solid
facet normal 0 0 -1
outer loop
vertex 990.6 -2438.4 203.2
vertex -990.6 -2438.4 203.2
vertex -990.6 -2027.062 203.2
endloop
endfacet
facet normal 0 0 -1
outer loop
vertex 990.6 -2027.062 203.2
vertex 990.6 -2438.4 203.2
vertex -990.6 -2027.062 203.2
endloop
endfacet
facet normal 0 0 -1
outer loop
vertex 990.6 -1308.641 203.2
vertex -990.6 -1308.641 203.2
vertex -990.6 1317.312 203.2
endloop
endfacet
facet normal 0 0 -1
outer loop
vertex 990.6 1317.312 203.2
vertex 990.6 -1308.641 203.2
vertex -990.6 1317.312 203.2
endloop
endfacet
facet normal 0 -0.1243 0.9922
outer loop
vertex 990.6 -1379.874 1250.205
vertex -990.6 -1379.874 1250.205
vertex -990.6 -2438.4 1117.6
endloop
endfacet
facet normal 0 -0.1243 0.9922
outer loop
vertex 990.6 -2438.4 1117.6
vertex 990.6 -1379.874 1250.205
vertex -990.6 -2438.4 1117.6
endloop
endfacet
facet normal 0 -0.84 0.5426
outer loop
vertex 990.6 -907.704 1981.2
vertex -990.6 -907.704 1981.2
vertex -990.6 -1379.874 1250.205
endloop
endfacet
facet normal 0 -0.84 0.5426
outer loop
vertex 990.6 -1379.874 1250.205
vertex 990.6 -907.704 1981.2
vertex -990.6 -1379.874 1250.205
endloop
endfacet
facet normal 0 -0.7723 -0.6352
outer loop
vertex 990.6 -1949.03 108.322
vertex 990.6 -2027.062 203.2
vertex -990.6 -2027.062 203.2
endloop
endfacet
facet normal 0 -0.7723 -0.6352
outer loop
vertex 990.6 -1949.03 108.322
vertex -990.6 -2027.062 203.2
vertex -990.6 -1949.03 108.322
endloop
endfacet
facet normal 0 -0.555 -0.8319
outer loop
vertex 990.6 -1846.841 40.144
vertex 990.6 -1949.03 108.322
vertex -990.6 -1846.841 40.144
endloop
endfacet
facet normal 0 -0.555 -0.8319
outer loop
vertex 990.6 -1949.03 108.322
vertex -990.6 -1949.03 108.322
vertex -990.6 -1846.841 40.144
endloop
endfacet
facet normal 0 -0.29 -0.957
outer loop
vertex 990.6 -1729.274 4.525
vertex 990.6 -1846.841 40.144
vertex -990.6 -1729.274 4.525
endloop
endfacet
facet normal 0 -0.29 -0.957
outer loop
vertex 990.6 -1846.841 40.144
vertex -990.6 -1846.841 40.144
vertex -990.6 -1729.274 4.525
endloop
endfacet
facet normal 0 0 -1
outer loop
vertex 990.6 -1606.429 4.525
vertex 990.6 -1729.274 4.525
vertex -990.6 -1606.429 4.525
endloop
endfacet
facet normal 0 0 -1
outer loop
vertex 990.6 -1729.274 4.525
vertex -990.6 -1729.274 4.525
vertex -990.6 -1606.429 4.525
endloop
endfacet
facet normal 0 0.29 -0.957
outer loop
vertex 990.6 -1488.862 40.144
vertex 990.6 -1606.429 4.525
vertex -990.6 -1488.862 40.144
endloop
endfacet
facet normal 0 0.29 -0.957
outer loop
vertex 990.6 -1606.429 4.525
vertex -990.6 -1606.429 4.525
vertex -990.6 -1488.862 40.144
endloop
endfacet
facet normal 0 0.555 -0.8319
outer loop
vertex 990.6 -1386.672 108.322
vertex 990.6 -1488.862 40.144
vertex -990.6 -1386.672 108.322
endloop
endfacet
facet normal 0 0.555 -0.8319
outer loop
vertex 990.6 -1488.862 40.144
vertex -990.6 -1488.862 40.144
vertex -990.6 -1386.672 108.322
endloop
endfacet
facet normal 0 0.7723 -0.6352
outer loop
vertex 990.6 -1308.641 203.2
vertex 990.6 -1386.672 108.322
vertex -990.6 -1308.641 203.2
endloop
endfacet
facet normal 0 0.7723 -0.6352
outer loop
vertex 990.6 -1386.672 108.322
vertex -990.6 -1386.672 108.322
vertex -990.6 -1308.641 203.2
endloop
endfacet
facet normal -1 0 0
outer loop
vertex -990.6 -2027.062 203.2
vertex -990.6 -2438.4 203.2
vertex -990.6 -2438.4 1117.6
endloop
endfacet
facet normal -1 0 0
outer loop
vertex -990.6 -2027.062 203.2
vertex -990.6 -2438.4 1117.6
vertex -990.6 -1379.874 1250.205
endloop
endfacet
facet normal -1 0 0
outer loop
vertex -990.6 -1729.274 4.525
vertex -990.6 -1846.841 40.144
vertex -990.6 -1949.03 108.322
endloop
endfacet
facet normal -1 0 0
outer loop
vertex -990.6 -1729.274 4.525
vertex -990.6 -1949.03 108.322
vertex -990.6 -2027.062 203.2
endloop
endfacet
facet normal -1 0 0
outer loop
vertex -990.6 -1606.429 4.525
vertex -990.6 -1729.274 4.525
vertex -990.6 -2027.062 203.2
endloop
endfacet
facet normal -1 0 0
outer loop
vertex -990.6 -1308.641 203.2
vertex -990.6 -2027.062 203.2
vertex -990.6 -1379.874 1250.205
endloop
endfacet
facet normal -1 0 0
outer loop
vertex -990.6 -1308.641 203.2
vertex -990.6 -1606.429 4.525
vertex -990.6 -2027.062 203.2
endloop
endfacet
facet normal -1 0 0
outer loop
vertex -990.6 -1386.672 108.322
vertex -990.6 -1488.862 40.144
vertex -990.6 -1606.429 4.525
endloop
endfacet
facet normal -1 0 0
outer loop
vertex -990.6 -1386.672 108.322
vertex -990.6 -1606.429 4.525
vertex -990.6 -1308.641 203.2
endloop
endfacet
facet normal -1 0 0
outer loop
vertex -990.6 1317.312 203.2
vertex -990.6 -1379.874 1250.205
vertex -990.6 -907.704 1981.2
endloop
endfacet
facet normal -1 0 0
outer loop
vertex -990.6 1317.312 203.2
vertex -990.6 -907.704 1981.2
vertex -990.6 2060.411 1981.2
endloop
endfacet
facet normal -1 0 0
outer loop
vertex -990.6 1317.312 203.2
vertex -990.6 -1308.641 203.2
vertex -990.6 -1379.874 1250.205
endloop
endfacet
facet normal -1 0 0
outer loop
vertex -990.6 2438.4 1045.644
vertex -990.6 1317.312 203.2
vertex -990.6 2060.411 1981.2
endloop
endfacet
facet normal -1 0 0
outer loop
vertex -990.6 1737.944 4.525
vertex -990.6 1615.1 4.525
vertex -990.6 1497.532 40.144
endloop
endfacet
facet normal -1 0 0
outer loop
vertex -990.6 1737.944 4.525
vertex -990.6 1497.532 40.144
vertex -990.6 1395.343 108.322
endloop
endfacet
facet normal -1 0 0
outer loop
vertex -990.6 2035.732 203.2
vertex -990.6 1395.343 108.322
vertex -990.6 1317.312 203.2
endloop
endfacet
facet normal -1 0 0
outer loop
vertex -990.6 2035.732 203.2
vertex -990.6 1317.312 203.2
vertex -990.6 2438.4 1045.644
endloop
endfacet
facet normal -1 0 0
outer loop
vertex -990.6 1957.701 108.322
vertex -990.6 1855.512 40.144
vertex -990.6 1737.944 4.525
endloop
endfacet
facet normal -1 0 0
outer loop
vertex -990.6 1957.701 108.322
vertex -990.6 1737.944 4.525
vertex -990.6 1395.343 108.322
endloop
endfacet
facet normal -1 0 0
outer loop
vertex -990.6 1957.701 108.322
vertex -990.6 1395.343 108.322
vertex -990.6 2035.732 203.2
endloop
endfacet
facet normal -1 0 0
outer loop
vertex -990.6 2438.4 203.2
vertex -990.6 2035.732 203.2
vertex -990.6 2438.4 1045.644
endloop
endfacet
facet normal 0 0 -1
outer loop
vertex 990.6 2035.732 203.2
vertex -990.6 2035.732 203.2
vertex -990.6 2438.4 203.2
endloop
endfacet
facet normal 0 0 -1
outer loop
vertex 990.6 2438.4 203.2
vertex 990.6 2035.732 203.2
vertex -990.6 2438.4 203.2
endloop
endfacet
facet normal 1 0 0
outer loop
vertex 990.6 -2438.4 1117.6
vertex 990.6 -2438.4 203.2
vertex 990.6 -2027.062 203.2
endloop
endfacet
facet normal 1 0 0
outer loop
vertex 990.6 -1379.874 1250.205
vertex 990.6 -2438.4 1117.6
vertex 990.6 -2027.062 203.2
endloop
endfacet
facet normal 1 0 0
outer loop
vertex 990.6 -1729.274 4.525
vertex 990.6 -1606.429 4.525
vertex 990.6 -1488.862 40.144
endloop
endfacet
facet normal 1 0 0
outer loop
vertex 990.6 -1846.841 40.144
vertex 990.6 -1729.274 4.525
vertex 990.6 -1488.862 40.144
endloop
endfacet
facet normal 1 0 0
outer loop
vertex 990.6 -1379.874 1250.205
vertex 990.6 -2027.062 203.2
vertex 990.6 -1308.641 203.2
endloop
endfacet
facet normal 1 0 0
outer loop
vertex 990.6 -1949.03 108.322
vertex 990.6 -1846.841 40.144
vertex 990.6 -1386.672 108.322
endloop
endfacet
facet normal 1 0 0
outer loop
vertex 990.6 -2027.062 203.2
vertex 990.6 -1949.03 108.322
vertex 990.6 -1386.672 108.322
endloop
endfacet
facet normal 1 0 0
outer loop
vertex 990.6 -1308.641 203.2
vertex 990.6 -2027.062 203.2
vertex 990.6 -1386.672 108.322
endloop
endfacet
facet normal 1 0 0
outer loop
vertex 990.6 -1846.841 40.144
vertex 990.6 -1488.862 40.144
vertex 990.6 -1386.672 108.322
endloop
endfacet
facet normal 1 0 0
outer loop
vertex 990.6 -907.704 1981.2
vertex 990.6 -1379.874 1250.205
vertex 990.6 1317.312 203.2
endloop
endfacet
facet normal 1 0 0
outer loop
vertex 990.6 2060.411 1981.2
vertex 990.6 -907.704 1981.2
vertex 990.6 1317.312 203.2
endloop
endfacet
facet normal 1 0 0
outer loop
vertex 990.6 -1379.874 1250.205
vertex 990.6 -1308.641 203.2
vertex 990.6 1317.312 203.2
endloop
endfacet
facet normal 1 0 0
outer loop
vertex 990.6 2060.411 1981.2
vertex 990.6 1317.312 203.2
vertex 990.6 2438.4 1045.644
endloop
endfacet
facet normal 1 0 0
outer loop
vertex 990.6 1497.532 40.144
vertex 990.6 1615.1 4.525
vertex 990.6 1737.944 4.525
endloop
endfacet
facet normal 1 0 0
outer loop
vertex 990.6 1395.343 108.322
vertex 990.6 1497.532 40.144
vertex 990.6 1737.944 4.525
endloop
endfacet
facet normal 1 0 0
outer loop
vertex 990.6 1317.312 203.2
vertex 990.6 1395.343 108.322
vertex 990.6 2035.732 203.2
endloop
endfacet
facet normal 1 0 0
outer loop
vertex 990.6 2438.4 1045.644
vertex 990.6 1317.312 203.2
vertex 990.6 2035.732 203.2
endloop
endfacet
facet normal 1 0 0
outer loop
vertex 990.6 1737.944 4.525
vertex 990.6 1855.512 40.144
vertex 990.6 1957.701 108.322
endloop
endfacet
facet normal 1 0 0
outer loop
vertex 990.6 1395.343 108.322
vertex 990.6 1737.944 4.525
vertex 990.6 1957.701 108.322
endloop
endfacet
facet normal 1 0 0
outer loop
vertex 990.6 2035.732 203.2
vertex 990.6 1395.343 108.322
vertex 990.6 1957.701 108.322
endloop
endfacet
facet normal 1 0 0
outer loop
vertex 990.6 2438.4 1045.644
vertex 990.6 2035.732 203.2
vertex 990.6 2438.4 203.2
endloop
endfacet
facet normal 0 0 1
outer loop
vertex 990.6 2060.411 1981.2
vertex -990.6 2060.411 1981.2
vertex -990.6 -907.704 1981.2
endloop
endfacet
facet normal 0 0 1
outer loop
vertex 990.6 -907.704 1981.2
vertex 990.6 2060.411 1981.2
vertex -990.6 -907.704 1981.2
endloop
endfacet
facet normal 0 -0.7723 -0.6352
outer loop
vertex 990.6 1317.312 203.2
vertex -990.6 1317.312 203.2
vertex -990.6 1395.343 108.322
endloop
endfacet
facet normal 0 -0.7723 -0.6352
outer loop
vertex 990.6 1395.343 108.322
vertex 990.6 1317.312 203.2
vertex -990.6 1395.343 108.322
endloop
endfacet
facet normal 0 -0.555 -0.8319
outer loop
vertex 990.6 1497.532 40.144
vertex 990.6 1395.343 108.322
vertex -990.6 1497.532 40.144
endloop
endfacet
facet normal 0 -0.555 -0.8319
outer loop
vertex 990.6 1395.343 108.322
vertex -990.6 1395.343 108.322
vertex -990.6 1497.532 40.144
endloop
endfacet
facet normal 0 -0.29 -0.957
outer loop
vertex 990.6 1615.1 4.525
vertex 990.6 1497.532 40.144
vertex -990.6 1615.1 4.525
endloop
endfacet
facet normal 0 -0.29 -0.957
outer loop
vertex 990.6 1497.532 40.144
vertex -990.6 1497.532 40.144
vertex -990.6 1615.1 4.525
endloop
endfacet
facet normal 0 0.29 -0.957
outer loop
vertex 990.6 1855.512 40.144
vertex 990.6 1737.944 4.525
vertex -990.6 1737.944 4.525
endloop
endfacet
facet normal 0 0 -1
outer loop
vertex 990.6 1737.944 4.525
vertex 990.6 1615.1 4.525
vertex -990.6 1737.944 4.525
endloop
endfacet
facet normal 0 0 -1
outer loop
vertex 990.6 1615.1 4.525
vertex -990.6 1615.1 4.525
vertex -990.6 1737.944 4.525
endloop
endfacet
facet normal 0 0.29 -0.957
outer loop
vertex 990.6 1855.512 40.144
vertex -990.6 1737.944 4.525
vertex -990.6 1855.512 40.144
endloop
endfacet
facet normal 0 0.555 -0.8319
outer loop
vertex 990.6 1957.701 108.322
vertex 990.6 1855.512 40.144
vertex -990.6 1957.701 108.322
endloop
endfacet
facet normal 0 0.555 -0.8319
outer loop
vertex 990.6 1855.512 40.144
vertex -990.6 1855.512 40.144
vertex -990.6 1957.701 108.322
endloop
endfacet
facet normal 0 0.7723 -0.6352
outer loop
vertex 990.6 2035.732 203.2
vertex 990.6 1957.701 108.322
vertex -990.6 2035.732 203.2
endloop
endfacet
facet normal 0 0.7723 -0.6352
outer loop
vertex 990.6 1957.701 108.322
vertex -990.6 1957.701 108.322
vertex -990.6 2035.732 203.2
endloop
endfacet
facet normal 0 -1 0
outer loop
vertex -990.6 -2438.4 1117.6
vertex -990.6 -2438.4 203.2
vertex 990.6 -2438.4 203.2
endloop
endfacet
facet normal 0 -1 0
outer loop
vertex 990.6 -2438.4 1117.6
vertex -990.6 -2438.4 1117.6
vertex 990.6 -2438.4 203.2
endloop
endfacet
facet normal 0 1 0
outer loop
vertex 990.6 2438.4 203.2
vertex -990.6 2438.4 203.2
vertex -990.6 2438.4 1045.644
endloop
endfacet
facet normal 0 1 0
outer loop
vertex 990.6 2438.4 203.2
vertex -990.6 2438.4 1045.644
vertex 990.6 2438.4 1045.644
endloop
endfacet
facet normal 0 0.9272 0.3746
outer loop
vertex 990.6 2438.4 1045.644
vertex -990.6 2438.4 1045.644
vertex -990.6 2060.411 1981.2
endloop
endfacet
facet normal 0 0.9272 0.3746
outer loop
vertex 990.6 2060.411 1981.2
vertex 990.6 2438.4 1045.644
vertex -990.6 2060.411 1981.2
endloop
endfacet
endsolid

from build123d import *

# Parameters (mm, degrees)
F0_W     = 1981.2
F0_H     = 4876.8
F1_DEPTH = 3048
F3_DEPTH = 6096


with BuildPart() as f1:
    # F0 (on Top) → F1 (new body)
    with BuildSketch(Plane.XY):
        Rectangle(F0_W, F0_H)
    extrude(amount=F1_DEPTH)

    # F2 (on face) → F3 (cut)
    with BuildSketch(Plane(origin=(-990.6, 0, 0), x_dir=(0, -1, 0), z_dir=(-1, 0, 0))):
        Polygon((1379.873641154, 1250.2053831043), (2438.4, 1117.6), (2438.4, 3048), (-2438.4, 3048), (-2438.4, 1045.6442832947), (-2060.410954721, 1981.2), (907.7037284231, 1981.2), align=None)
        with BuildLine():
            Line((2438.4, 0), (2438.4, 203.2))
            Line((2438.4, 203.2), (2027.0615872515, 203.2))
            ThreePointArc((2027.0615872515, 203.2), (1874.2019202661, 54.320273291), (1667.8513478767, 0))
            Line((1667.8513478767, 0), (2438.4, 0))
        make_face()
        with BuildLine():
            ThreePointArc((1667.8513478767, 0), (1461.5007693106, 54.3202705987), (1308.641097566, 203.2))
            Line((1308.641097566, 203.2), (-1317.311745224, 203.2))
            ThreePointArc((-1317.311745224, 203.2), (-1470.171414589, 54.3202719448), (-1676.5219900668, 0))
            Line((-1676.5219900668, 0), (1667.8513478767, 0))
        make_face()
        with BuildLine():
            Line((-2438.4, 0), (-1676.5219900668, 0))
            ThreePointArc((-1676.5219900668, 0), (-1882.8725655446, 54.3202719448), (-2035.7322349096, 203.2))
            Line((-2035.7322349096, 203.2), (-2438.4, 203.2))
            Line((-2438.4, 203.2), (-2438.4, 0))
        make_face()
    extrude(amount=-F3_DEPTH, mode=Mode.SUBTRACT)


solid = f1.part
